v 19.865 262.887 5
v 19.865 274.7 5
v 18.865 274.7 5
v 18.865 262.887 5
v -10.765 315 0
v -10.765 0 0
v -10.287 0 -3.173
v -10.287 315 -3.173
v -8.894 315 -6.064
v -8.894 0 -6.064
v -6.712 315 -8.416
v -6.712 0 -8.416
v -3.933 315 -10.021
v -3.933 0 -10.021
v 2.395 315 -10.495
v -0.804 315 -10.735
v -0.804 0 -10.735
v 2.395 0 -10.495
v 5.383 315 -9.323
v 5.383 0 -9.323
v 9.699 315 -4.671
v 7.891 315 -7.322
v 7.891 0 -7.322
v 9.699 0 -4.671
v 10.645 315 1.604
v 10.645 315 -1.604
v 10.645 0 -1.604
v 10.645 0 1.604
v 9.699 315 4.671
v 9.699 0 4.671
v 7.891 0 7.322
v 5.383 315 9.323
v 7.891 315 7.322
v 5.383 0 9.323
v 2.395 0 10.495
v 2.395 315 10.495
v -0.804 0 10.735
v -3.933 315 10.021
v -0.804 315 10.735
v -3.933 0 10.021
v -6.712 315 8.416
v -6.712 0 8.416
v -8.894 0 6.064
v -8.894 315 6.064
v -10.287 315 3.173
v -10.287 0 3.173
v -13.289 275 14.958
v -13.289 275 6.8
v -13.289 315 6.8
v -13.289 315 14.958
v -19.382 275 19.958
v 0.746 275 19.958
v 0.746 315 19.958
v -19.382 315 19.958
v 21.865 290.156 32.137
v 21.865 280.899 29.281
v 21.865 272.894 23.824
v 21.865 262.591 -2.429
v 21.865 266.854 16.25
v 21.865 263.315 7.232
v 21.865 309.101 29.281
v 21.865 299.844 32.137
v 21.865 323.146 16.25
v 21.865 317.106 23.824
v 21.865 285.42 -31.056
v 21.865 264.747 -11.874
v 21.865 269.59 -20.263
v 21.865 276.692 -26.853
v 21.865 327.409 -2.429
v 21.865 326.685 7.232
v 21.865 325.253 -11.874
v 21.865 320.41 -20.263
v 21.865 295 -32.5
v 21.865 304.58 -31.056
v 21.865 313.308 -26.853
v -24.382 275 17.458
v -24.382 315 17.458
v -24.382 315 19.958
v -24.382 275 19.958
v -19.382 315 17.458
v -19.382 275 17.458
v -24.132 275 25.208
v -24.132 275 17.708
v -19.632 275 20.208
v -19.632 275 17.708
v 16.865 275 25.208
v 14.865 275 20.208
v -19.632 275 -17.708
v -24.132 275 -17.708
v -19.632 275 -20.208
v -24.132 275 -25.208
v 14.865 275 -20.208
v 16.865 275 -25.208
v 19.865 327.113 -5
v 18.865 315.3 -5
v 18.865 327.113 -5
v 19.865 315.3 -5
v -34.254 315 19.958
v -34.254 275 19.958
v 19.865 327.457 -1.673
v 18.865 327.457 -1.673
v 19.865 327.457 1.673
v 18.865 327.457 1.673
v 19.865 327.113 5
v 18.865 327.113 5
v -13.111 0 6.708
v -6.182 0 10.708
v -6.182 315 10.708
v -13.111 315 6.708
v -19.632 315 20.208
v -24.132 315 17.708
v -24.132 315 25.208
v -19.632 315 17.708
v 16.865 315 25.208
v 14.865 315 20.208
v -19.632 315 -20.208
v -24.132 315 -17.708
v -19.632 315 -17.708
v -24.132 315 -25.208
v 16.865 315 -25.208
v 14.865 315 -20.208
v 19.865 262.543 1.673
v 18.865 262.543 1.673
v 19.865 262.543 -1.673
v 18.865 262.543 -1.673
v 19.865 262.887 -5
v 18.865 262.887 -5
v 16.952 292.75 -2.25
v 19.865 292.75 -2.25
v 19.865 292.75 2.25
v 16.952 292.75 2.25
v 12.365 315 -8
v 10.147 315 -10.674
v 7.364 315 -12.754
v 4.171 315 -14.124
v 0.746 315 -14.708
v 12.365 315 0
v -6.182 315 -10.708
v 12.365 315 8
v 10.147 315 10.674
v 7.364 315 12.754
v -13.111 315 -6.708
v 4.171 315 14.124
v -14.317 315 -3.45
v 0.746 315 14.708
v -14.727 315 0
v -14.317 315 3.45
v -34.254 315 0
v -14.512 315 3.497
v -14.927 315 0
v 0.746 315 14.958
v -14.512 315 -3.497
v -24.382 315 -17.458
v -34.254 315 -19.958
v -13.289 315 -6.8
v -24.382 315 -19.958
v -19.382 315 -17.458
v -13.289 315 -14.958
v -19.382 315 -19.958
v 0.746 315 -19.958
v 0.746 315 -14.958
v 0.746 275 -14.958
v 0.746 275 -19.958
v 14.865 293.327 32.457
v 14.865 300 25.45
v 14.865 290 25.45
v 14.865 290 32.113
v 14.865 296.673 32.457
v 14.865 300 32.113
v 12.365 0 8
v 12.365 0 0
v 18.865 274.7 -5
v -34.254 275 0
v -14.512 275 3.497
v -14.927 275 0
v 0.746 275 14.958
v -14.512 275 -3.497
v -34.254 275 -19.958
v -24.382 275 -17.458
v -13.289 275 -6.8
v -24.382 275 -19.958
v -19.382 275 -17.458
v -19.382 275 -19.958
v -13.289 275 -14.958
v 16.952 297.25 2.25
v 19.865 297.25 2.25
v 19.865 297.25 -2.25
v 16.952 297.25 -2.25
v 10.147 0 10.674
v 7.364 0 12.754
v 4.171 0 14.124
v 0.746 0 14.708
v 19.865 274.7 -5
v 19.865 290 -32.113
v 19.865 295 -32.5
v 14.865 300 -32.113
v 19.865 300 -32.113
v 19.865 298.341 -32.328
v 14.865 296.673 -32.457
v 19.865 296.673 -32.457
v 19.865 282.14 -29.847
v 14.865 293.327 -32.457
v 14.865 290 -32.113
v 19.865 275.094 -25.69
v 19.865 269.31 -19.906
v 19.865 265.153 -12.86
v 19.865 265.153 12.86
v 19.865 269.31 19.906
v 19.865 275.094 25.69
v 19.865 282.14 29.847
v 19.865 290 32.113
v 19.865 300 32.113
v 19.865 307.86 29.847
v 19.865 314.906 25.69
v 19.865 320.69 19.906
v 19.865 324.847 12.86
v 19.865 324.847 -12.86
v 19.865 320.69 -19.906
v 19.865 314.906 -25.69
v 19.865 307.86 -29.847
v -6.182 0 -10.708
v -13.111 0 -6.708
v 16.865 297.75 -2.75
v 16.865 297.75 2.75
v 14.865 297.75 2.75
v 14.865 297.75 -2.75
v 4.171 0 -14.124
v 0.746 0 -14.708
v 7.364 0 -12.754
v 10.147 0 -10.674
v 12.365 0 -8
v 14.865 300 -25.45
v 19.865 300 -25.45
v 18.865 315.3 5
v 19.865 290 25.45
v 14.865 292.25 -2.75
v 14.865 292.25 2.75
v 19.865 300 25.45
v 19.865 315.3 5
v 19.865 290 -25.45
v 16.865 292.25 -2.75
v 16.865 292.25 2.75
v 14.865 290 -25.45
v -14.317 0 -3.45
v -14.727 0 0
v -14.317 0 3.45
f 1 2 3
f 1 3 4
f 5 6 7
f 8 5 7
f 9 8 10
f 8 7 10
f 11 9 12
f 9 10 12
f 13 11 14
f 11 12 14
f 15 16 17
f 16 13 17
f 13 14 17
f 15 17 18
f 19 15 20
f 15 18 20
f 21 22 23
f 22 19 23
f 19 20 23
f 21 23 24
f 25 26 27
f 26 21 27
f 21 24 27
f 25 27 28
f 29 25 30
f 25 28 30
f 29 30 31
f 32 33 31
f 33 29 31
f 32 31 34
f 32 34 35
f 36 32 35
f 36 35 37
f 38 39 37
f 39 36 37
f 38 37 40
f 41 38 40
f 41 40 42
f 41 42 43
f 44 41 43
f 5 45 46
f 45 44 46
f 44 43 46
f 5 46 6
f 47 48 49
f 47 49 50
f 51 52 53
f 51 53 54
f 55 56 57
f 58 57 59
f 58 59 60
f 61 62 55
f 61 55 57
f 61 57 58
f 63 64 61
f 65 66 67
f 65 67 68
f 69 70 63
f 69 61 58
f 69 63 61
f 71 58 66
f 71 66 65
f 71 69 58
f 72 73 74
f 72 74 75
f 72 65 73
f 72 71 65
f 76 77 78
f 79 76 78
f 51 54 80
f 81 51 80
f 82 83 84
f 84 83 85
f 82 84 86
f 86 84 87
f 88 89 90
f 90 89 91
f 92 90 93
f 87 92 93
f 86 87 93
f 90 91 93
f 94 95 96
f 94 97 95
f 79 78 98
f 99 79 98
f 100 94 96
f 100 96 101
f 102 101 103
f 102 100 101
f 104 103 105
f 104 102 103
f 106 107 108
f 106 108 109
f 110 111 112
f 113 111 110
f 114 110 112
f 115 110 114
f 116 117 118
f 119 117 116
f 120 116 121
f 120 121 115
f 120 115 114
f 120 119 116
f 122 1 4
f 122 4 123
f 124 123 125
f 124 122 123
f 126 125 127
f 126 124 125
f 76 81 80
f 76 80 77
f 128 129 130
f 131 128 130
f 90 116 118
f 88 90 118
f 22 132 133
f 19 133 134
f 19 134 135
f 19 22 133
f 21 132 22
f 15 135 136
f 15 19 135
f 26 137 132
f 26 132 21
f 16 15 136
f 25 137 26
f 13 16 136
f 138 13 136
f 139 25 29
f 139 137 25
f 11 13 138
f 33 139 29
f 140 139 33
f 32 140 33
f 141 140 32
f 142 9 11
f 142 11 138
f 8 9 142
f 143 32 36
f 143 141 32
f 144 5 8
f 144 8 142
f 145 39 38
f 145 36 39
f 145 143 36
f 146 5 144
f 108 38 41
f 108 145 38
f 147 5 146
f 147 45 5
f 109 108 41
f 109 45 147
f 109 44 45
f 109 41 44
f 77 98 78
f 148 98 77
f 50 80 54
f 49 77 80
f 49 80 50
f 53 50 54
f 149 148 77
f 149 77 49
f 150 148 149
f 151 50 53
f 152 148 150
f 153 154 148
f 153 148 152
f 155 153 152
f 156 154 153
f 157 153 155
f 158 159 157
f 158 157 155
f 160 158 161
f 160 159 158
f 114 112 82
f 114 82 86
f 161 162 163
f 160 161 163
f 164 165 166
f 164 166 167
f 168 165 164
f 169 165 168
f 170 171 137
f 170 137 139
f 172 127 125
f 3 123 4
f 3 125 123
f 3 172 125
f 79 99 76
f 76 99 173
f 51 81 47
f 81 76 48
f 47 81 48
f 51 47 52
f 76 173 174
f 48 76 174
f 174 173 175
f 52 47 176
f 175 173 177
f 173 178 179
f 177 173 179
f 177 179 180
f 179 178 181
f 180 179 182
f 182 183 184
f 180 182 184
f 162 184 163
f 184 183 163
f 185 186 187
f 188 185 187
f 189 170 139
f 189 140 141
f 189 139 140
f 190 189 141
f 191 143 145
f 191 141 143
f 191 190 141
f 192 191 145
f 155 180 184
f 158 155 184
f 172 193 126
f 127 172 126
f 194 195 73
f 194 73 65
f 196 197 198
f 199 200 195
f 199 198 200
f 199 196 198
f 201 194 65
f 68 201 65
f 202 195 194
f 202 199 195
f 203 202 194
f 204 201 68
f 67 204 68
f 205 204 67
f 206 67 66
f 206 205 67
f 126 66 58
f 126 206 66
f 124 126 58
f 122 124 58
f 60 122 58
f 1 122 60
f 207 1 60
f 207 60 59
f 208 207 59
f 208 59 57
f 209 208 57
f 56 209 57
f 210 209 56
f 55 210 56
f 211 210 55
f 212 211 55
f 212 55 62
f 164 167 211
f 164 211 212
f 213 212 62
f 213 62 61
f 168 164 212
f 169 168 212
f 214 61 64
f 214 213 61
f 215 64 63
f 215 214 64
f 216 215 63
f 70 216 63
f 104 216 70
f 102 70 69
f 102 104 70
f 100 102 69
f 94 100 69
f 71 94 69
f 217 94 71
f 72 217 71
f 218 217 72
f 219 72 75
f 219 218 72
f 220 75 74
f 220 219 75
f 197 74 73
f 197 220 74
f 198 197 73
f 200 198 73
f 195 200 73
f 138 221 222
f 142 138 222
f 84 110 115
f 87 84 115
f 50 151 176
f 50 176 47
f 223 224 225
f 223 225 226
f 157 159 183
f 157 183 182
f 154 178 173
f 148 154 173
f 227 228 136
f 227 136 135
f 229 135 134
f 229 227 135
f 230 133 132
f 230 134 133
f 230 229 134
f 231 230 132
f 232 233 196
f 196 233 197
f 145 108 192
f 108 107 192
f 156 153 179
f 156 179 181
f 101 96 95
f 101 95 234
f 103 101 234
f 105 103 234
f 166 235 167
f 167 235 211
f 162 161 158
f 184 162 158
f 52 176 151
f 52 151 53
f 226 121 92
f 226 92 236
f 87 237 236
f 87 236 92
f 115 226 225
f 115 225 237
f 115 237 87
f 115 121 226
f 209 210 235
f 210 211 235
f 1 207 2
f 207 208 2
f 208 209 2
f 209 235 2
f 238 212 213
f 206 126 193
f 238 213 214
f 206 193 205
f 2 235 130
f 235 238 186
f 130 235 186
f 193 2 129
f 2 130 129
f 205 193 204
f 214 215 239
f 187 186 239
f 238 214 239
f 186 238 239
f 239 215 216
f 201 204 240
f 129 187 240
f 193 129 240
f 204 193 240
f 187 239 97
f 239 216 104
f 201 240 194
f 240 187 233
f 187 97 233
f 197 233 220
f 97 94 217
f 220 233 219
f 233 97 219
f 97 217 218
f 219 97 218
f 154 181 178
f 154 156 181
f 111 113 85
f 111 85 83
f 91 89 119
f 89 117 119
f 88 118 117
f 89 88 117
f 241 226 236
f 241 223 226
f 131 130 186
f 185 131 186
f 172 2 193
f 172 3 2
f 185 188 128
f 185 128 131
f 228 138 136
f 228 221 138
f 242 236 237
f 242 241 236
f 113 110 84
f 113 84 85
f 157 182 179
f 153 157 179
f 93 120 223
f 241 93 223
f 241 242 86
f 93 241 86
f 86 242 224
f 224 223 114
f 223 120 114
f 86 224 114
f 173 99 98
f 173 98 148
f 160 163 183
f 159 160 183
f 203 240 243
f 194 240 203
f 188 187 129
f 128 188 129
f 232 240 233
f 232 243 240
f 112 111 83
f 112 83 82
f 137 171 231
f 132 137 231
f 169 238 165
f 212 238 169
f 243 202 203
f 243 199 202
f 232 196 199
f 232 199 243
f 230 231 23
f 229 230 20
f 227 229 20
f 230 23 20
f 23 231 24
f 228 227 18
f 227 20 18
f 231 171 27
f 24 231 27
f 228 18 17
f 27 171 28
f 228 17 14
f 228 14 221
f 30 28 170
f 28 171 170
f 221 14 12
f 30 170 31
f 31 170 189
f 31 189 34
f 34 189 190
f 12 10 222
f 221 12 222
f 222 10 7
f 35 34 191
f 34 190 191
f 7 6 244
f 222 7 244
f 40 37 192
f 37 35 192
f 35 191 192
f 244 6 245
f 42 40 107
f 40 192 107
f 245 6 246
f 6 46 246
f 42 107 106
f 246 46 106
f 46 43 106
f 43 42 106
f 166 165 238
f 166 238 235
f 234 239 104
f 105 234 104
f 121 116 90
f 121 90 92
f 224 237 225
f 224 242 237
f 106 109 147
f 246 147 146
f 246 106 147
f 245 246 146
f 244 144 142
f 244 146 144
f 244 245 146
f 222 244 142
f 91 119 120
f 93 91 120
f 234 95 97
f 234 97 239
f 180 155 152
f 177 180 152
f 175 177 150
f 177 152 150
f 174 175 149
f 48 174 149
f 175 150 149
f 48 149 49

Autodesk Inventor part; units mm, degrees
ref_plane "YZ Plane" through (0, 0, 0) normal (1, 0, 0) x (0, 1, 0)
ref_plane "XZ Plane" through (0, 0, 0) normal (0, 1, 0) x (-1, 0, 0)
ref_plane "XY Plane" through (0, 0, 0) normal (0, 0, 1) x (1, 0, 0)
sketch "Sketch1" plane through (0, 0, 0) normal (0, 1, 0) x (-1, 0, 0)
  circle A0 centre (0, 0) radius 10.765
  line L0 (0, 0) -> (162.1519, 0) construction
  line L1 (0, 0) -> (190.4731, 0) construction
  line L2 (0, 0) -> (10.765, 0) construction
  line L3 (6.1825, -10.7084) -> (13.1107, -6.7084)
  line L4 (6.1825, -10.7084) -> (-0.7457, -14.7084)
  line L5 (6.1825, 10.7084) -> (-0.7457, 14.7084)
  line L6 (6.1825, 10.7084) -> (13.1107, 6.7084)
  line L7 (-12.365, 0) -> (-12.365, -8)
  line L8 (-12.365, 0) -> (-12.365, 8)
  arc A1 (-0.7457, 14.7084) -> (-12.365, 8) centre (0, 0) ccw
  arc A2 (-12.365, -8) -> (-0.7457, -14.7084) centre (0, 0) ccw
  arc A3 (13.1107, -6.7084) -> (13.1107, 6.7084) centre (0, 0) ccw
  dimension "d6" = 8
  dimension "d7" = 8
  dimension "d8" = 21.53
  dimension "d11" = 360
extrude "Extrusion1" add sketch "Sketch1" along normal blind 315
sketch "Sketch2" plane through (0, 315, 0) normal (0, 1, 0) x (1, 0, 0)
  arc A0 (-13.1107, 6.7084) -> (-13.1107, -6.7084) centre (0, 0) ccw projected
  arc A1 (-13.2887, 6.7995) -> (-13.2887, -6.7995) centre (0, 0) ccw
  line L0 (-13.2887, 6.7995) -> (-13.2887, 14.9584)
  line L1 (0.7457, 14.9584) -> (-13.2887, 14.9584)
  circle A2 centre (0, 0) radius 10.765 projected
  line L2 (-13.2887, -6.7995) -> (-13.2887, -14.9584)
  line L3 (0.7457, -14.9584) -> (-13.2887, -14.9584)
  line L4 (0.7457, 14.9584) -> (0.7457, 19.9584)
  line L5 (-34.2543, 19.9584) -> (-34.2543, 0)
  line L6 (0.7457, -14.9584) -> (0.7457, -19.9584)
  line L7 (-34.2543, -19.9584) -> (-34.2543, 0)
  line L8 (-19.3823, 19.9584) -> (-19.3823, 17.4584)
  line L9 (-19.3823, 17.4584) -> (-24.3823, 17.4584)
  line L10 (-24.3823, 17.4584) -> (-24.3823, 19.9584)
  line L11 (0.7457, 19.9584) -> (-19.3823, 19.9584)
  line L12 (-24.3823, 19.9584) -> (-34.2543, 19.9584)
  line L13 (-19.3823, -19.9584) -> (-19.3823, -17.4584)
  line L14 (-19.3823, -17.4584) -> (-24.3823, -17.4584)
  line L15 (-24.3823, -17.4584) -> (-24.3823, -19.9584)
  line L16 (0.7457, -19.9584) -> (-19.3823, -19.9584)
  line L17 (-24.3823, -19.9584) -> (-34.2543, -19.9584)
  dimension "d15" = 0.2
  dimension "d18" = 5
  dimension "d19" = 35
  dimension "d20" = 5
extrude "Extrusion2" add sketch "Sketch2" against normal blind 40 separate body contours A1 L2 L3 L6 L16 L13 L14 L15 L17 L7 L5 L12 L10 L9 L8 L11 L4 L1 L0
sketch "Sketch3" plane through (0, 315, 0) normal (0, 1, 0) x (1, 0, 0)
  line L0 (-19.3823, 19.9584) -> (-19.3823, 17.4584) projected
  line L1 (-19.3823, 17.4584) -> (-24.3823, 17.4584) projected
  line L2 (-24.3823, 17.4584) -> (-24.3823, 19.9584) projected
  line L3 (-19.6323, 19.9584) -> (-19.6323, 17.7084)
  line L4 (-19.6323, 17.7084) -> (-24.1323, 17.7084)
  line L5 (-24.1323, 17.7084) -> (-24.1323, 19.9584)
  line L6 (-19.6323, 19.9584) -> (-19.6323, 20.2084)
  line L7 (-19.3823, 19.9584) -> (0.7457, 19.9584) projected
  line L8 (-19.6323, 19.9584) -> (-19.3823, 19.9584) construction
  line L9 (-19.6323, 20.2084) -> (14.865, 20.2084)
  line L10 (12.365, -8) -> (12.365, 8) projected
  line L11 (12.365, 0) -> (14.865, 0)
  line L12 (14.865, 0) -> (14.865, 20.2084)
  line L13 (-24.1323, 19.9584) -> (-24.1323, 25.2084)
  line L14 (-24.1323, 25.2084) -> (14.865, 25.2084)
  line L15 (14.865, 25.2084) -> (16.865, 25.2084)
  line L16 (16.865, 25.2084) -> (16.865, 0)
  line L17 (0, 0) -> (2.9179, 0)
  line L18 (-19.6323, -19.9584) -> (-19.6323, -17.7084)
  line L19 (-19.6323, -17.7084) -> (-24.1323, -17.7084)
  line L20 (-24.1323, -17.7084) -> (-24.1323, -19.9584)
  line L21 (-19.6323, -19.9584) -> (-19.6323, -20.2084)
  line L22 (-19.3823, -19.9584) -> (0.7457, -19.9584)
  line L23 (-19.6323, -19.9584) -> (-19.3823, -19.9584) construction
  line L24 (-19.6323, -20.2084) -> (14.865, -20.2084)
  line L25 (14.865, 0) -> (14.865, -20.2084)
  line L26 (-24.1323, -19.9584) -> (-24.1323, -25.2084)
  line L27 (-24.1323, -25.2084) -> (14.865, -25.2084)
  line L28 (14.865, -25.2084) -> (16.865, -25.2084)
  line L29 (16.865, -25.2084) -> (16.865, 0)
  point P0 (-19.3823, -17.4584)
  dimension "d23" = 0.25
  dimension "d24" = 0.25
  dimension "d25" = 90
  dimension "d26" = 90
  dimension "d27" = 2.5
  dimension "d28" = 5.25
  dimension "d29" = 2
extrude "Extrusion3" add sketch "Sketch3" against normal blind 40 separate body
sketch "Sketch4" plane through (16.865, 315, 25.2084) normal (1, 0, 0) x (0, 0, -1)
  line L0 (33.2084, -315) -> (33.2084, 0) projected
  line L1 (17.2084, -315) -> (17.2084, 0) projected
  line L2 (0, 0) -> (0, -40) projected
  line L3 (0, 0) -> (50.4168, 0) projected
  line L4 (50.4168, 0) -> (50.4168, -40) projected
  line L5 (50.4168, -40) -> (0, -40) projected
  line L6 (27.9584, -22.75) -> (22.4584, -22.75)
  line L7 (22.4584, -22.75) -> (22.4584, -17.25)
  line L8 (22.4584, -17.25) -> (27.9584, -17.25)
  line L9 (27.9584, -17.25) -> (27.9584, -22.75)
  line L10 (27.9584, -22.75) -> (22.4584, -17.25) construction
  line L11 (22.4584, -22.75) -> (27.9584, -17.25) construction
  point P0 (25.2084, -315)
  point P1 (25.2084, -20)
  dimension "d32" = 5.5
  dimension "d33" = 5.5
extrude "Extrusion4" cut sketch "Sketch4" against normal blind 3.4875 contours L6 L7 L8 L9 bodies 3
sketch "Sketch5" plane through (16.865, 315, 25.2084) normal (1, 0, 0) x (0, 0, -1)
  line L0 (22.4584, -22.75) -> (22.4584, -17.25) projected
  line L1 (27.9584, -22.75) -> (22.4584, -22.75) projected
  line L2 (27.9584, -17.25) -> (27.9584, -22.75) projected
  line L3 (22.4584, -17.25) -> (27.9584, -17.25) projected
  line L4 (27.7084, -17.5) -> (27.7084, -22.5)
  line L5 (27.7084, -22.5) -> (22.7084, -22.5)
  line L6 (22.7084, -22.5) -> (22.7084, -17.5)
  line L7 (22.7084, -17.5) -> (27.7084, -17.5)
  point P0 (25.2084, -315)
  dimension "d36" = 0.25
extrude "Extrusion5" add sketch "Sketch5" along normal mid plane 6 separate body contours L4 L5 L6 L7
sketch "Sketch6" plane through (19.865, 315, 25.2084) normal (1, 0, 0) x (0, 0, -1)
  line L0 (27.7084, -22.5) -> (27.7084, -17.5) projected
  line L1 (27.7084, -17.5) -> (22.7084, -17.5) projected
  line L2 (22.7084, -17.5) -> (22.7084, -22.5) projected
  line L3 (22.7084, -22.5) -> (27.7084, -22.5) projected
  line L4 (22.7084, -17.5) -> (22.7084, -22.5) projected
  line L5 (22.7084, -22.5) -> (27.7084, -22.5) projected
  line L6 (27.7084, -22.5) -> (27.7084, -17.5) projected
  line L7 (27.7084, -17.5) -> (22.7084, -17.5) projected
  circle A0 centre (25.2084, -20) radius 32.5
  point P0 (25.2084, -315)
  dimension "d39" = 65
extrude "Extrusion6" add sketch "Sketch6" along normal blind 2 bodies 4
sketch "Sketch7" plane through (19.865, 315, 25.2084) normal (1, 0, 0) x (0, 0, -1)
  point P0 (25.2084, -315)
sketch "Sketch8" plane through (21.865, 295, 0) normal (1, 0, 0) x (0, 0, -1)
  line L0 (-2.5, -2.5) -> (-2.5, 2.5) projected
  line L1 (-2.5, 2.5) -> (2.5, 2.5) projected
  line L2 (2.5, 2.5) -> (2.5, -2.5) projected
  line L3 (2.5, -2.5) -> (-2.5, -2.5) projected
  point P0 (0, -295)
extrude "Extrusion7" add sketch "Sketch8" against normal blind 2.35 bodies 4
sketch "Sketch9" plane through (13.865, 315, 25.2084) normal (-1, 0, 0) x (0, 0, 1)
  line L0 (-29.608, -15.5608) -> (-20.4879, -15.5608)
  line L1 (-20.4879, -15.5608) -> (-20.4879, -24.3637)
  line L2 (-20.4879, -24.3637) -> (-29.608, -24.3637)
  line L3 (-29.608, -24.3637) -> (-29.608, -15.5608)
  point P0 (-25.2084, -315)
extrude "Extrusion8" cut sketch "Sketch9" against normal blind 3.0875 bodies 4
sketch "Sketch10" plane through (19.865, 295, 0) normal (-1, 0, 0) x (0, 0, 1)
  line L0 (-2.5, 2.5) -> (2.5, 2.5) projected
  line L1 (-2.5, -2.5) -> (-2.5, 2.5) projected
  line L2 (2.5, -2.5) -> (-2.5, -2.5) projected
  line L3 (2.5, 2.5) -> (2.5, -2.5) projected
  line L4 (-2.25, -2.25) -> (2.25, -2.25)
  line L5 (2.25, -2.25) -> (2.25, 2.25)
  line L6 (2.25, 2.25) -> (-2.25, 2.25)
  line L7 (-2.25, 2.25) -> (-2.25, -2.25)
  line L8 (-2.25, -2.25) -> (2.25, 2.25) construction
  line L9 (2.25, -2.25) -> (-2.25, 2.25) construction
  line L10 (-2.5, 2.5) -> (2.5, 2.5)
  line L11 (2.5, 2.5) -> (2.5, -2.5)
  line L12 (2.5, -2.5) -> (-2.5, -2.5)
  line L13 (-2.5, -2.5) -> (-2.5, 2.5)
  line L14 (-2.5, 2.5) -> (2.5, -2.5) construction
  line L15 (2.5, 2.5) -> (-2.5, -2.5) construction
  point P0 (0, -295)
  point P1 (0, 0)
  dimension "d46" = 4.5
  dimension "d47" = 4.5
extrude "Extrusion9" cut sketch "Sketch10" along normal blind 6.2625 bodies 4
sketch "Sketch11" plane through (-24.1323, 315, 25.2084) normal (0, 0, 1) x (1, 0, 0)
  point P0 (24.1323, -315)
sketch "Sketch12" plane through (19.865, 295, 0) normal (-1, 0, 0) x (0, 0, 1)
  circle A0 centre (0, 0) radius 32.5 projected
  line L0 (25.2084, 20) -> (25.2084, -20) projected
  line L1 (25.4, 0) -> (25.4, 5)
  line L2 (25.4, 5) -> (32.1131, 5)
  arc A1 (32.5, 0) -> (32.1131, 5) centre (0, 0) ccw
  line L3 (25.4, 0) -> (25.4, -5)
  line L4 (25.4, -5) -> (32.1131, -5)
  arc A2 (32.1131, -5) -> (32.5, 0) centre (0, 0) ccw
  line L5 (-25.4, 0) -> (-25.4, 5)
  line L6 (-25.4, 5) -> (-32.1131, 5)
  arc A3 (-32.1131, 5) -> (-32.5, 0) centre (0, 0) ccw
  line L7 (-25.4, -5) -> (-32.1131, -5)
  line L8 (-25.4, 0) -> (-25.4, -5)
  arc A4 (-32.5, 0) -> (-32.1131, -5) centre (0, 0) ccw
  point P0 (0, -295)
  point P1 (32.1131, -5)
  point P2 (-32.1131, 5)
  point P3 (-32.1131, -5)
  dimension "d50" = 7.1
  dimension "d52" = 5
extrude "Extrusion10" add sketch "Sketch12" along normal blind 5 contours A0 L4 L3 L1 L2 | L6 L5 L8 L7 A0 bodies 4
sketch "Sketch13" plane through (19.865, 315, 25.2084) normal (-1, 0, 0) x (0, 0, 1)
  line L0 (-18.5, 0) -> (-31.9168, 0) projected
  line L1 (-25.2084, 0.25) -> (-20.2084, 0.25)
  arc A0 (6.9047, -15) -> (-57.3215, -15) centre (-25.2084, -20) ccw projected
  line L2 (-20.2084, 0.25) -> (-20.2084, 12.1131)
  line L3 (-25.2084, 0.25) -> (-30.2084, 0.25)
  line L4 (-30.2084, 0.25) -> (-30.2084, 12.1131)
  arc A1 (-20.2084, 12.1131) -> (-30.2084, 12.1131) centre (-25.2084, -20) ccw
  line L5 (-25.2084, -40.25) -> (-20.2084, -40.25)
  line L6 (-20.2084, -40.25) -> (-20.2084, -52.1131)
  line L7 (-25.2084, -40.25) -> (-30.2084, -40.25)
  line L8 (-30.2084, -40.25) -> (-30.2084, -52.1131)
  arc A2 (-30.2084, -52.1131) -> (-20.2084, -52.1131) centre (-25.2084, -20) ccw
  point P0 (-25.2084, -315)
  point P1 (-18.5, -40)
  dimension "d56" = 5
  dimension "d57" = 5
extrude "Extrusion11" add sketch "Sketch13" along normal blind 5 bodies 4
sketch "Sketch14" plane through (14.865, 315, 25.2084) normal (-1, 0, 0) x (0, 0, 1)
  line L0 (-20.2084, 0.25) -> (-20.2084, 0.3)
  line L1 (-20.2084, 0.25) -> (-20.2084, 12.1131) projected
  line L2 (-30.2084, 0.3) -> (-50.6584, 0.3)
  line L3 (-50.6084, -15) -> (-50.6084, -25) projected
  line L4 (-50.6084, -15) -> (-50.6584, -15)
  line L5 (-50.6584, -15) -> (-50.6584, 0.3)
  line L6 (-30.2084, 0.3) -> (-25.2084, 0.3)
  line L7 (-50.6584, -15) -> (-50.6584, -20)
  line L8 (-20.2084, 0.3) -> (0.2416, 0.3)
  line L9 (0.1916, -15) -> (0.2416, -15)
  line L10 (0.2416, -15) -> (0.2416, 0.3)
  line L11 (-20.2084, 0.3) -> (-25.2084, 0.3)
  line L12 (0.2416, -15) -> (0.2416, -20)
  line L13 (-20.2084, -40.25) -> (-20.2084, -40.3)
  line L14 (-30.2084, -40.3) -> (-50.6584, -40.3)
  line L15 (-50.6584, -25) -> (-50.6584, -40.3)
  line L16 (-30.2084, -40.3) -> (-25.2084, -40.3)
  line L17 (-50.6584, -25) -> (-50.6584, -20)
  line L18 (-20.2084, -40.3) -> (0.2416, -40.3)
  line L19 (0.2416, -25) -> (0.2416, -40.3)
  line L20 (0.2416, -25) -> (0.2416, -20)
  line L21 (-20.2084, -40.3) -> (-25.2084, -40.3)
  line L22 (-29.4997, -16.0212) -> (-20.2084, -16.0212)
  line L23 (-20.2084, -16.0212) -> (-20.2084, -24.0433)
  line L24 (-20.2084, -24.0433) -> (-29.4997, -24.0433)
  line L25 (-29.4997, -24.0433) -> (-29.4997, -16.0212)
  point P0 (-25.2084, -315)
  point P1 (6.9047, -15)
  dimension "d60" = 0.05
  dimension "d61" = 0.05
extrude "Extrusion12" cut sketch "Sketch14" against normal blind 5 bodies 4
sketch "Sketch15" plane through (14.865, 295, 0) normal (-1, 0, 0) x (0, 0, 1)
  line L0 (-12.8519, 40.0431) -> (11.8192, 40.0431)
  line L1 (11.8192, 40.0431) -> (11.8192, 16.7136)
  line L2 (11.8192, 16.7136) -> (-12.8519, 16.7136)
  line L3 (-12.8519, 16.7136) -> (-12.8519, 40.0431)
  line L4 (-18.8893, -12.8023) -> (17.1858, -12.8023)
  line L5 (17.1858, -12.8023) -> (17.1858, -35.3865)
  line L6 (17.1858, -35.3865) -> (-18.8893, -35.3865)
  line L7 (-18.8893, -35.3865) -> (-18.8893, -12.8023)
  point P0 (0, -295)
extrude "Extrusion13" cut sketch "Sketch15" against normal blind 4 bodies 4
properties part number "Funda_Escoba_v1"
